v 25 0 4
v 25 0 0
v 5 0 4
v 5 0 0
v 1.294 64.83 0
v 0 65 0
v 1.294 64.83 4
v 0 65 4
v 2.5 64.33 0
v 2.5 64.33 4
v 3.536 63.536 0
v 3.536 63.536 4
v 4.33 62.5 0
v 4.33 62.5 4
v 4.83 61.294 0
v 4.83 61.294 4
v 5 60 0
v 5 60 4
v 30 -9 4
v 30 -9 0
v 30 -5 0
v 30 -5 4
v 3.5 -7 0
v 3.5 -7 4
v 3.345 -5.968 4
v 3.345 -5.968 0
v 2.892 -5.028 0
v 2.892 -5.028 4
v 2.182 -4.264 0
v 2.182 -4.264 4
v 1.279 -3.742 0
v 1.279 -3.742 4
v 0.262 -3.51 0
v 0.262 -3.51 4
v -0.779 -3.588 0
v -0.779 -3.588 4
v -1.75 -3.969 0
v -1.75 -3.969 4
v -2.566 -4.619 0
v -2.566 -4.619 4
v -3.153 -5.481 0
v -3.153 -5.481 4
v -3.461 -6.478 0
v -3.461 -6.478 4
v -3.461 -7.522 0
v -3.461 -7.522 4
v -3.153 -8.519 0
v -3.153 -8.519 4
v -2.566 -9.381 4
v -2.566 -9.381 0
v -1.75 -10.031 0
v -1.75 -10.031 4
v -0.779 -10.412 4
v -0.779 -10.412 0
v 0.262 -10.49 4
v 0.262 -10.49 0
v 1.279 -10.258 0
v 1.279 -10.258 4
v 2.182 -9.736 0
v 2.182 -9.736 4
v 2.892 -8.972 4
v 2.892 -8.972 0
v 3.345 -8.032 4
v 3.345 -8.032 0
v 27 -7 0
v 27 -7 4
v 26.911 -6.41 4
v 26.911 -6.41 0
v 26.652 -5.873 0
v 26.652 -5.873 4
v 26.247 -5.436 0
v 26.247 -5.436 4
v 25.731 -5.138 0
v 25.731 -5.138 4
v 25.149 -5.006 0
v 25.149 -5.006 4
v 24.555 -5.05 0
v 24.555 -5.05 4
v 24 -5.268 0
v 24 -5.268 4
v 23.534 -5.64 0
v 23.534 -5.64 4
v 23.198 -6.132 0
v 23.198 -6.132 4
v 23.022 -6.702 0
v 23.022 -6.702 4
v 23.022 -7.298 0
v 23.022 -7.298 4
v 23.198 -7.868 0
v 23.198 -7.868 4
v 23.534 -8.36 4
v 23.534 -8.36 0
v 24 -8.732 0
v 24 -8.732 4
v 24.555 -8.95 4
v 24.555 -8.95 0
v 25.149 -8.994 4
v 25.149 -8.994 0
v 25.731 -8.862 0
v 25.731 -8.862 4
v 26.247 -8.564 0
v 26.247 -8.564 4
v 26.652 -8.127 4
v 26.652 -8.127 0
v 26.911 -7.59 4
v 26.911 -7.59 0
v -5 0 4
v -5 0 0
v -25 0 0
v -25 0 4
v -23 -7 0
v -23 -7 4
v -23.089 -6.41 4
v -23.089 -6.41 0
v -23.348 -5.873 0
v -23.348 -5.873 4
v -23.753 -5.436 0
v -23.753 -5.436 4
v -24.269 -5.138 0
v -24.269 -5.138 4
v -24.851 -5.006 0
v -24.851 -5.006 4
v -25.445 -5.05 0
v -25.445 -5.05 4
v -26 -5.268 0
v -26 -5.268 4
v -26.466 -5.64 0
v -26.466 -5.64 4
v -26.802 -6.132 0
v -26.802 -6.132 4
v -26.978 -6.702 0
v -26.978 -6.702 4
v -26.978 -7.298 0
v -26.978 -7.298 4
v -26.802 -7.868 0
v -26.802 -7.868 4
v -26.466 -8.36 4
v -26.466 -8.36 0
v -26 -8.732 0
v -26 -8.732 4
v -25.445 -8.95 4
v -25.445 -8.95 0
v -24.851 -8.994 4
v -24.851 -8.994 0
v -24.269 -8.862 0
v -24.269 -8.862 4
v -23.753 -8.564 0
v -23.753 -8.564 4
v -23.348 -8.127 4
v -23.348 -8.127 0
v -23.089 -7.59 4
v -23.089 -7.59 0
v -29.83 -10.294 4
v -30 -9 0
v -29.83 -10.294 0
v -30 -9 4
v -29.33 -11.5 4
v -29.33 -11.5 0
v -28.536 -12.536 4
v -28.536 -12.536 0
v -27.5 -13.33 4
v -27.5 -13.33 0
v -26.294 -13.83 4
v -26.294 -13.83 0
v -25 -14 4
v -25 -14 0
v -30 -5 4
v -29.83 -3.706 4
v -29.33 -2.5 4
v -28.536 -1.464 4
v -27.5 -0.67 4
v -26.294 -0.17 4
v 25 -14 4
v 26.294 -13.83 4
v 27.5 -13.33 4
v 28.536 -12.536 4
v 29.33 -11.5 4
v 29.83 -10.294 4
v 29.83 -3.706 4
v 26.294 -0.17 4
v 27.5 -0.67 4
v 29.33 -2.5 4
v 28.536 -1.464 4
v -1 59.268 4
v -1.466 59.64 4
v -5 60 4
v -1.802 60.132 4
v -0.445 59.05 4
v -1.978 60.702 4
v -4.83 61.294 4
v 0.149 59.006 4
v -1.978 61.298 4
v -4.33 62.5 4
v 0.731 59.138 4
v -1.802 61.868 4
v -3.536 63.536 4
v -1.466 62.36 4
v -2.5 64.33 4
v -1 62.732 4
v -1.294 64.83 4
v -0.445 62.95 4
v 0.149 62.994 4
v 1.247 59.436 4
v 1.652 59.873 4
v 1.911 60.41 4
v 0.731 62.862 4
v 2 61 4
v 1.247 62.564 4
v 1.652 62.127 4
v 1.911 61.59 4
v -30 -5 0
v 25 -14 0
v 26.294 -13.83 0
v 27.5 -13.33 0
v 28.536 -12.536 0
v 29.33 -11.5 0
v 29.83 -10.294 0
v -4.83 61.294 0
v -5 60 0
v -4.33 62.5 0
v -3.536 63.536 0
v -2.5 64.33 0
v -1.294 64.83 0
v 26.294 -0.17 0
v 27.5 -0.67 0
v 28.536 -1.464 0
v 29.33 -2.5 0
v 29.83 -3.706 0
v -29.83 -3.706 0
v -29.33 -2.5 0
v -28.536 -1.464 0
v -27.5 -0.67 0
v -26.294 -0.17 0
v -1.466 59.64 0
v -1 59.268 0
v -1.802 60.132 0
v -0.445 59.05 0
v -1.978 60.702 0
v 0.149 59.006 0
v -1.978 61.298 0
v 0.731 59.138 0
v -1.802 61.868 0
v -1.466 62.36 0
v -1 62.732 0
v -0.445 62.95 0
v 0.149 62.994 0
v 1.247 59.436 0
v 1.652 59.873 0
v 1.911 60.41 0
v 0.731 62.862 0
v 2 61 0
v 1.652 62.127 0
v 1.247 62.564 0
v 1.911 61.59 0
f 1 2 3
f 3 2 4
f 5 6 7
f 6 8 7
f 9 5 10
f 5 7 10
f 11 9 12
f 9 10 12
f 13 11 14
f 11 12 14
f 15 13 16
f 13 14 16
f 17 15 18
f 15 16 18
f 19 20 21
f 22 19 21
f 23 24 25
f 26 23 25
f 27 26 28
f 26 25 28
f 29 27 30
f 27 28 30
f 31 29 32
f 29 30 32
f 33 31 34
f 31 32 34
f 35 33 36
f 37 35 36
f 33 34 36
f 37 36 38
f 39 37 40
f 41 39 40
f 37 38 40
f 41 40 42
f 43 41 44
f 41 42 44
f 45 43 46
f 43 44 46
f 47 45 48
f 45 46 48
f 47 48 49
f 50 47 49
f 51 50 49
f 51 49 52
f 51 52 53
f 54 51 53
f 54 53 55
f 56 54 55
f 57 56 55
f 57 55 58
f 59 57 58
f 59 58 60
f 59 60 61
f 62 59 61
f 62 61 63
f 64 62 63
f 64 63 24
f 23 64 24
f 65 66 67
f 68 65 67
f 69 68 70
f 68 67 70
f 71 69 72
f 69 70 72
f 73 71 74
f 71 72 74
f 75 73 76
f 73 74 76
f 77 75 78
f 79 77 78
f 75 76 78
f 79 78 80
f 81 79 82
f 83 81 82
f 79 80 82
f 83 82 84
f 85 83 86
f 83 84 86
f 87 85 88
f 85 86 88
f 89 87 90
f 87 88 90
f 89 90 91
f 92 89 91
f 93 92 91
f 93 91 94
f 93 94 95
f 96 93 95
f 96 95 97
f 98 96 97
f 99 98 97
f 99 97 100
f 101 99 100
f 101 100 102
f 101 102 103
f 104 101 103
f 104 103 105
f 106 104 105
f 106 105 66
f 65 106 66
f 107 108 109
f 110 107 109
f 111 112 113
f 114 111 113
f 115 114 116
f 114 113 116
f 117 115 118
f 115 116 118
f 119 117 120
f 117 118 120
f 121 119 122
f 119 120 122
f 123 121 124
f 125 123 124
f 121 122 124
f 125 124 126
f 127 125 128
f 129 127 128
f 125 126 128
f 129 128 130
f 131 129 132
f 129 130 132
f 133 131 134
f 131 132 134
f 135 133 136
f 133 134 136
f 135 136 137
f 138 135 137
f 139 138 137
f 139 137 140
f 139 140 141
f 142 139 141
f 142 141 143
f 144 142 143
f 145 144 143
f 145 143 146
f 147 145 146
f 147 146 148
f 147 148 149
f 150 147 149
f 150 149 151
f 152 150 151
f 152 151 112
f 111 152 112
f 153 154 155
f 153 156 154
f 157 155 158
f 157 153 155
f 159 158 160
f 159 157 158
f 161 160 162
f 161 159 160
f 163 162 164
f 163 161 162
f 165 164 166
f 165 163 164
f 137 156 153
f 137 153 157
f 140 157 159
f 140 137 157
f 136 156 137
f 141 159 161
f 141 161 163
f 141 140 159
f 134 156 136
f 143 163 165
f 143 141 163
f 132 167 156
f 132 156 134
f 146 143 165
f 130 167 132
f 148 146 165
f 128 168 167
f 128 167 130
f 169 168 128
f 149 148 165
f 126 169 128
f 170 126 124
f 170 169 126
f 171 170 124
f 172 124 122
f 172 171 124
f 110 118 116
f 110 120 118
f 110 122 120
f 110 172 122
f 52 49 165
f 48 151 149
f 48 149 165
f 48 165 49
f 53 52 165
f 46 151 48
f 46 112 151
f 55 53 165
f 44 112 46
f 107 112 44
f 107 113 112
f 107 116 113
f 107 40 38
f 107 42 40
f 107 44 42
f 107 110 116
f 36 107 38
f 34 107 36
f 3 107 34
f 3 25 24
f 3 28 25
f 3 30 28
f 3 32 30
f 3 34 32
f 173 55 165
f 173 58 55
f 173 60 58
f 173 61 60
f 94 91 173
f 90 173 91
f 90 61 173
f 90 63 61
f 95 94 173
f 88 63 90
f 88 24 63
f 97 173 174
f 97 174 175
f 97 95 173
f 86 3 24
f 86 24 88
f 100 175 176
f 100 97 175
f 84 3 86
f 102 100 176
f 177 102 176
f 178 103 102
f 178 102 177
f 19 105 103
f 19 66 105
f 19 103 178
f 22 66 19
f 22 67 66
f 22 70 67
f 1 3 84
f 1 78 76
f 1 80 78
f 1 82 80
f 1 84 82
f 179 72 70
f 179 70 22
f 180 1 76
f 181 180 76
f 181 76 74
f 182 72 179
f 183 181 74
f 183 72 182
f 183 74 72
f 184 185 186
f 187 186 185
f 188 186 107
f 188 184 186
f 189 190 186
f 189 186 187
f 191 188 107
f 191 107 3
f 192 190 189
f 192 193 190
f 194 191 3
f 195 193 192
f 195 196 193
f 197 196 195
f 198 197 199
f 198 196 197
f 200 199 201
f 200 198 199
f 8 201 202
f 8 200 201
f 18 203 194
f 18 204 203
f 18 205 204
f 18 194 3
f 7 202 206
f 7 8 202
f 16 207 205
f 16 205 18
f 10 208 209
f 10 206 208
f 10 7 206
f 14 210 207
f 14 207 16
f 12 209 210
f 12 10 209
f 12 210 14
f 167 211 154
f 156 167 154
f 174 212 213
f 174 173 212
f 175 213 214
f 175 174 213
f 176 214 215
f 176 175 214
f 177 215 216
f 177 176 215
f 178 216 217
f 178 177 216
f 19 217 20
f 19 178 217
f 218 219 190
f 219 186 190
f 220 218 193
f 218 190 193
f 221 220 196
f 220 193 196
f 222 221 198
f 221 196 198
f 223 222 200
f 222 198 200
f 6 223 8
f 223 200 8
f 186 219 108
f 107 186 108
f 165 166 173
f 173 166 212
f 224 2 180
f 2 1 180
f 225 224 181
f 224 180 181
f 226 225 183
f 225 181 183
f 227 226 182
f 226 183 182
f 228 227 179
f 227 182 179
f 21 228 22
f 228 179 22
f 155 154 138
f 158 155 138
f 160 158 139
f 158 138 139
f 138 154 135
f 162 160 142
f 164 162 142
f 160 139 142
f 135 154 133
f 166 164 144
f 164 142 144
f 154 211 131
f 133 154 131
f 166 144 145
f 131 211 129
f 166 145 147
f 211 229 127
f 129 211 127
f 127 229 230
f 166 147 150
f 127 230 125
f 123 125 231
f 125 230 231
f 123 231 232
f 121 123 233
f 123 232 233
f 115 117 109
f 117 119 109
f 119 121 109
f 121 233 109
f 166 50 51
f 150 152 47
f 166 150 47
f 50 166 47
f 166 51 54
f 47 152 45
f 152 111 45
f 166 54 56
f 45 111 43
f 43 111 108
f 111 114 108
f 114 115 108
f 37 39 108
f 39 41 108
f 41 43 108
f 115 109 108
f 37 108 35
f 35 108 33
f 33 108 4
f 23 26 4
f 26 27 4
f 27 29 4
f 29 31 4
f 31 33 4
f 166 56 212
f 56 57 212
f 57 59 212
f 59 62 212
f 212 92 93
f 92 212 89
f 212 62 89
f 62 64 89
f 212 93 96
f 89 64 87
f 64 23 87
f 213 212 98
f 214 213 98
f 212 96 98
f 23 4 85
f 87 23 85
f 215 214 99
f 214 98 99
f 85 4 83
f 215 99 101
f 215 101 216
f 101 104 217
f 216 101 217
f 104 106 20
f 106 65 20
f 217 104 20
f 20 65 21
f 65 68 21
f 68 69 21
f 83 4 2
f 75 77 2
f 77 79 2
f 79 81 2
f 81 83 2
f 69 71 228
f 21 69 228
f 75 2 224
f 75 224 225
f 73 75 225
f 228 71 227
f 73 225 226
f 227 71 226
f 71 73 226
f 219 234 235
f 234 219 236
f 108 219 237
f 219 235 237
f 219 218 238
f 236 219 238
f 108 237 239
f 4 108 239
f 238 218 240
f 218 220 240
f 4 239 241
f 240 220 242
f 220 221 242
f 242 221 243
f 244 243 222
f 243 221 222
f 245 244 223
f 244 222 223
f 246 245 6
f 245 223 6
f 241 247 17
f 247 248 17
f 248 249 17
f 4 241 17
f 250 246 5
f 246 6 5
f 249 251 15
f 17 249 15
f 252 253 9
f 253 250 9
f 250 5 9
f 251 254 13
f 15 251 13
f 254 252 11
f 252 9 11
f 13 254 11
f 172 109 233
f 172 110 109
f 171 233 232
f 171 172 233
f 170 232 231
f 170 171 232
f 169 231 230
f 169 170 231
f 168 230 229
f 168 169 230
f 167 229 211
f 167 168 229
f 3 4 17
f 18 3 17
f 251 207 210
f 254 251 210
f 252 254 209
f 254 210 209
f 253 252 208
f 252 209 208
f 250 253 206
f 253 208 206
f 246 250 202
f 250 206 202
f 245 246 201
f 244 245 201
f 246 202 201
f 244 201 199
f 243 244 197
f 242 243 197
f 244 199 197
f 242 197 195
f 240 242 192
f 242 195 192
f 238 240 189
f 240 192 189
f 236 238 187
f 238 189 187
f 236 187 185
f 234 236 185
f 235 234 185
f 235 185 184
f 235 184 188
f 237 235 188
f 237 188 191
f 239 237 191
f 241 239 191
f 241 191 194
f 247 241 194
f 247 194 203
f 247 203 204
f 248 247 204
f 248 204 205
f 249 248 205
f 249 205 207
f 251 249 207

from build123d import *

# Parameters (mm, degrees)
F1_DEPTH = 4
F2_R     = 2
F2_R_2   = 3.5
F3_DEPTH = 25
F4_R     = 4.99999


# Not quite as in the source:
# - a fillet or chamfer is up to 0.001 mm smaller than in the source, because OpenCascade refuses the exact size


with BuildPart() as f1:
    # F0 (on Top) → F1 (new body)
    with BuildSketch(Plane.XY):
        Polygon((-5, 65), (-5, 0), (-30, 0), (-30, -14), (30, -14), (30, 0), (5, 0), (5, 65), align=None)
    extrude(amount=F1_DEPTH)

    # F2 (on face) → F3 (cut)
    with BuildSketch(Plane.XY.offset(4)):
        with Locations((-25, -7)):
            Circle(F2_R)
        with Locations((25, -7)):
            Circle(F2_R)
        with Locations((0, -7)):
            Circle(F2_R_2)
        with Locations((0, 61)):
            Circle(F2_R)
    extrude(amount=-F3_DEPTH, mode=Mode.SUBTRACT)

    # F4 (radius 5 in the source; OpenCascade refuses exactly that, so slightly less here)
    f4_edges = [f1.edges().sort_by_distance(p)[0] for p in [
        (-30, -14, 2),
        (-30, 0, 2),
        (30, -14, 2),
        (30, 0, 2),
        (5, 65, 2),
        (-5, 65, 2),
    ]]
    fillet(f4_edges, radius=F4_R)


solid = f1.part
